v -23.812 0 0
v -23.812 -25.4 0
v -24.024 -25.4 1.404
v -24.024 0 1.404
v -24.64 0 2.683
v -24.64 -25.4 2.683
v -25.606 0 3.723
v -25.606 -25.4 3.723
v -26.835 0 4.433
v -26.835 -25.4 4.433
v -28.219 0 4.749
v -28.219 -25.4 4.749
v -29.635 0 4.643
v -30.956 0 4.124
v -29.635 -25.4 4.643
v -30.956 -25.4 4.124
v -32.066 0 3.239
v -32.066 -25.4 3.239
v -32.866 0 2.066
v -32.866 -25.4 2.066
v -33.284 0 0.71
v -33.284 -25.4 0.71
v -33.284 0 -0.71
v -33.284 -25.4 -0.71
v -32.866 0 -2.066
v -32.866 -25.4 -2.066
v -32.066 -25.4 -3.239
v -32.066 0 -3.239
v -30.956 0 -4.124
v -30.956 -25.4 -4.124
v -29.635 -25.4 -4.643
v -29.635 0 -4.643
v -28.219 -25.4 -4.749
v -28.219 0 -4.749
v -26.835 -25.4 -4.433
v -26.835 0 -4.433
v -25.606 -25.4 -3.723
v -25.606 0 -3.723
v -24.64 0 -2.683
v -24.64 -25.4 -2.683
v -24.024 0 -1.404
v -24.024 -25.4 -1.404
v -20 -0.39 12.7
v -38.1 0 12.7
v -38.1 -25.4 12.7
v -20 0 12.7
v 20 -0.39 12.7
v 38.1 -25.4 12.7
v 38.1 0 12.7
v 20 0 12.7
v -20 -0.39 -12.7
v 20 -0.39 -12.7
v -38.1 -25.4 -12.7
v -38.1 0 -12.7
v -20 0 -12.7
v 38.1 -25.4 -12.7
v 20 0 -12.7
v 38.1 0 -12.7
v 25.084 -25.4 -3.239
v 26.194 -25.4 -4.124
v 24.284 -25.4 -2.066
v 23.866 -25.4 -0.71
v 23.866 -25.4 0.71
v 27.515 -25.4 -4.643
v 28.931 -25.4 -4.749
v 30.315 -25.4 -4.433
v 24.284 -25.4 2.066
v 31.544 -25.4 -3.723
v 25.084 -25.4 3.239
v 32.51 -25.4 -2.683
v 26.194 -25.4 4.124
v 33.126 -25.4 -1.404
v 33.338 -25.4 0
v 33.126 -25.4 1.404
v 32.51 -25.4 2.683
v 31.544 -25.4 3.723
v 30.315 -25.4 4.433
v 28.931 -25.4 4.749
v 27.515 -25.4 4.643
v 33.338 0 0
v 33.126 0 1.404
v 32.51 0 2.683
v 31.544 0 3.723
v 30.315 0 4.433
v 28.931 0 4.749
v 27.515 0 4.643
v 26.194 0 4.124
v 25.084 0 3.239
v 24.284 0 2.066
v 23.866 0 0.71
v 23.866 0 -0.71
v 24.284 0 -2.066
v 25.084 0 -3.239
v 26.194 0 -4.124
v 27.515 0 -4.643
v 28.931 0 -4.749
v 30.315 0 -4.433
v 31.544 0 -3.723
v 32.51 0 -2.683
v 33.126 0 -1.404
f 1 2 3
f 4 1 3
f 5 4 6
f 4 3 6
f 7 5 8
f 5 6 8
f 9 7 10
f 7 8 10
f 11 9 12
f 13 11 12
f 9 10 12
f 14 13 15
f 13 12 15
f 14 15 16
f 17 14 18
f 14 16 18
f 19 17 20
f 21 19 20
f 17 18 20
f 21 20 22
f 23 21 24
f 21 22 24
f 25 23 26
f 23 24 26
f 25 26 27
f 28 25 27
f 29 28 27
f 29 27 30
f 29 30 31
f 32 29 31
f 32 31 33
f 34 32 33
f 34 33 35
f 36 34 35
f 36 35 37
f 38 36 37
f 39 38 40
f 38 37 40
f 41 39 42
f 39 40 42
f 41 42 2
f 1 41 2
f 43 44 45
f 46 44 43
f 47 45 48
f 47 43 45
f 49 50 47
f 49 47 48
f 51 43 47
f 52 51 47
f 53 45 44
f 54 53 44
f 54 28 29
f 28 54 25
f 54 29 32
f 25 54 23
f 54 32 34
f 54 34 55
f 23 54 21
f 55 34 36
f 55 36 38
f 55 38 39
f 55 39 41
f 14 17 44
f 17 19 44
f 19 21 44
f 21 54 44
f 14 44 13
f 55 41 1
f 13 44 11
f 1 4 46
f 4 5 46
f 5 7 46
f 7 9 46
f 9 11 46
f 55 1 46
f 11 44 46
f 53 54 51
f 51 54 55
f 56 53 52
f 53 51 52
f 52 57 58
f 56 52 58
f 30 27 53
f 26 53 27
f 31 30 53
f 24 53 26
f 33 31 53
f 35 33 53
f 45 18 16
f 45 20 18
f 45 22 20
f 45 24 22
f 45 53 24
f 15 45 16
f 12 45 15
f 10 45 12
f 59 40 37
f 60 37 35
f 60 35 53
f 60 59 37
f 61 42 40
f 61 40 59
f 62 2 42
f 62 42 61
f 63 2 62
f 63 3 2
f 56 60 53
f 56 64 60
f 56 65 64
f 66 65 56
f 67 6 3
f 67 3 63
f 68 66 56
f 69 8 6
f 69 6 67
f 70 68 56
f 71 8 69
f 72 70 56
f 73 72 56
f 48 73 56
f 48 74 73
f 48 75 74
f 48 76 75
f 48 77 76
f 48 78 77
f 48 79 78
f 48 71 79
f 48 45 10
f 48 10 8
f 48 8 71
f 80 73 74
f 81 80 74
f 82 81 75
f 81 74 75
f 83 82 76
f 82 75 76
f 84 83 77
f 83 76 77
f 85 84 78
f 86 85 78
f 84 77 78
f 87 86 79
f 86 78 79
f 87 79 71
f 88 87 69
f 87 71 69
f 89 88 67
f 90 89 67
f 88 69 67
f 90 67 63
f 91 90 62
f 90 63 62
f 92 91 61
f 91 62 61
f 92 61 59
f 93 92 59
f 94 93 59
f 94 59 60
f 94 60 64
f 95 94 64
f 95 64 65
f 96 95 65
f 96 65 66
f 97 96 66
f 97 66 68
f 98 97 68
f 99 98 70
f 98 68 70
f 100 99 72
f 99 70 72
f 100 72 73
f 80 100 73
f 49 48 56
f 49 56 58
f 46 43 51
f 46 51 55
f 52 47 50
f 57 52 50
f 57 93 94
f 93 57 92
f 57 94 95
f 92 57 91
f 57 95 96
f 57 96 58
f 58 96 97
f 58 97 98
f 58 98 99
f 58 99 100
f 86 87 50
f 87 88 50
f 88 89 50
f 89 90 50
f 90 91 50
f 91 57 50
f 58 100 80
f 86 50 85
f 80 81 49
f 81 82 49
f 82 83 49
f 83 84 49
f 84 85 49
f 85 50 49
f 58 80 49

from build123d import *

# Parameters (mm, degrees)
F0_W     = 76.2
F0_H     = 50.8
F1_DEPTH = 12.7
F2_W     = 40
F2_H     = 0.39
F3_DEPTH = 25.4
F4_R     = 4.7625
F5_DEPTH = 25.4


with BuildPart() as f1:
    # F0 (on Top) → F1 (new body, symmetric)
    with BuildSketch(Plane.XY):
        Rectangle(F0_W, F0_H)
    extrude(amount=F1_DEPTH, both=True)

    # F2 (on face) → F3 (cut)
    with BuildSketch(Plane.XY.offset(12.7)):
        Polygon((-20, 0), (-20, 0.39), (20, 0.39), (20, 0), (38.1, 0), (38.1, 25.4), (-38.1, 25.4), (-38.1, 0), align=None)
        with Locations((0, 0.195)):
            Rectangle(F2_W, F2_H)
        with Locations((0, -0.195)):
            Rectangle(F2_W, F2_H)
    extrude(amount=-F3_DEPTH, mode=Mode.SUBTRACT)

    # F4 (on face) → F5 (cut)
    with BuildSketch(Plane.XZ.offset(25.4)):
        with Locations((-28.575, 0)):
            Circle(F4_R)
        with Locations((28.575, 0)):
            Circle(F4_R)
    extrude(amount=-F5_DEPTH, mode=Mode.SUBTRACT)


solid = f1.part
